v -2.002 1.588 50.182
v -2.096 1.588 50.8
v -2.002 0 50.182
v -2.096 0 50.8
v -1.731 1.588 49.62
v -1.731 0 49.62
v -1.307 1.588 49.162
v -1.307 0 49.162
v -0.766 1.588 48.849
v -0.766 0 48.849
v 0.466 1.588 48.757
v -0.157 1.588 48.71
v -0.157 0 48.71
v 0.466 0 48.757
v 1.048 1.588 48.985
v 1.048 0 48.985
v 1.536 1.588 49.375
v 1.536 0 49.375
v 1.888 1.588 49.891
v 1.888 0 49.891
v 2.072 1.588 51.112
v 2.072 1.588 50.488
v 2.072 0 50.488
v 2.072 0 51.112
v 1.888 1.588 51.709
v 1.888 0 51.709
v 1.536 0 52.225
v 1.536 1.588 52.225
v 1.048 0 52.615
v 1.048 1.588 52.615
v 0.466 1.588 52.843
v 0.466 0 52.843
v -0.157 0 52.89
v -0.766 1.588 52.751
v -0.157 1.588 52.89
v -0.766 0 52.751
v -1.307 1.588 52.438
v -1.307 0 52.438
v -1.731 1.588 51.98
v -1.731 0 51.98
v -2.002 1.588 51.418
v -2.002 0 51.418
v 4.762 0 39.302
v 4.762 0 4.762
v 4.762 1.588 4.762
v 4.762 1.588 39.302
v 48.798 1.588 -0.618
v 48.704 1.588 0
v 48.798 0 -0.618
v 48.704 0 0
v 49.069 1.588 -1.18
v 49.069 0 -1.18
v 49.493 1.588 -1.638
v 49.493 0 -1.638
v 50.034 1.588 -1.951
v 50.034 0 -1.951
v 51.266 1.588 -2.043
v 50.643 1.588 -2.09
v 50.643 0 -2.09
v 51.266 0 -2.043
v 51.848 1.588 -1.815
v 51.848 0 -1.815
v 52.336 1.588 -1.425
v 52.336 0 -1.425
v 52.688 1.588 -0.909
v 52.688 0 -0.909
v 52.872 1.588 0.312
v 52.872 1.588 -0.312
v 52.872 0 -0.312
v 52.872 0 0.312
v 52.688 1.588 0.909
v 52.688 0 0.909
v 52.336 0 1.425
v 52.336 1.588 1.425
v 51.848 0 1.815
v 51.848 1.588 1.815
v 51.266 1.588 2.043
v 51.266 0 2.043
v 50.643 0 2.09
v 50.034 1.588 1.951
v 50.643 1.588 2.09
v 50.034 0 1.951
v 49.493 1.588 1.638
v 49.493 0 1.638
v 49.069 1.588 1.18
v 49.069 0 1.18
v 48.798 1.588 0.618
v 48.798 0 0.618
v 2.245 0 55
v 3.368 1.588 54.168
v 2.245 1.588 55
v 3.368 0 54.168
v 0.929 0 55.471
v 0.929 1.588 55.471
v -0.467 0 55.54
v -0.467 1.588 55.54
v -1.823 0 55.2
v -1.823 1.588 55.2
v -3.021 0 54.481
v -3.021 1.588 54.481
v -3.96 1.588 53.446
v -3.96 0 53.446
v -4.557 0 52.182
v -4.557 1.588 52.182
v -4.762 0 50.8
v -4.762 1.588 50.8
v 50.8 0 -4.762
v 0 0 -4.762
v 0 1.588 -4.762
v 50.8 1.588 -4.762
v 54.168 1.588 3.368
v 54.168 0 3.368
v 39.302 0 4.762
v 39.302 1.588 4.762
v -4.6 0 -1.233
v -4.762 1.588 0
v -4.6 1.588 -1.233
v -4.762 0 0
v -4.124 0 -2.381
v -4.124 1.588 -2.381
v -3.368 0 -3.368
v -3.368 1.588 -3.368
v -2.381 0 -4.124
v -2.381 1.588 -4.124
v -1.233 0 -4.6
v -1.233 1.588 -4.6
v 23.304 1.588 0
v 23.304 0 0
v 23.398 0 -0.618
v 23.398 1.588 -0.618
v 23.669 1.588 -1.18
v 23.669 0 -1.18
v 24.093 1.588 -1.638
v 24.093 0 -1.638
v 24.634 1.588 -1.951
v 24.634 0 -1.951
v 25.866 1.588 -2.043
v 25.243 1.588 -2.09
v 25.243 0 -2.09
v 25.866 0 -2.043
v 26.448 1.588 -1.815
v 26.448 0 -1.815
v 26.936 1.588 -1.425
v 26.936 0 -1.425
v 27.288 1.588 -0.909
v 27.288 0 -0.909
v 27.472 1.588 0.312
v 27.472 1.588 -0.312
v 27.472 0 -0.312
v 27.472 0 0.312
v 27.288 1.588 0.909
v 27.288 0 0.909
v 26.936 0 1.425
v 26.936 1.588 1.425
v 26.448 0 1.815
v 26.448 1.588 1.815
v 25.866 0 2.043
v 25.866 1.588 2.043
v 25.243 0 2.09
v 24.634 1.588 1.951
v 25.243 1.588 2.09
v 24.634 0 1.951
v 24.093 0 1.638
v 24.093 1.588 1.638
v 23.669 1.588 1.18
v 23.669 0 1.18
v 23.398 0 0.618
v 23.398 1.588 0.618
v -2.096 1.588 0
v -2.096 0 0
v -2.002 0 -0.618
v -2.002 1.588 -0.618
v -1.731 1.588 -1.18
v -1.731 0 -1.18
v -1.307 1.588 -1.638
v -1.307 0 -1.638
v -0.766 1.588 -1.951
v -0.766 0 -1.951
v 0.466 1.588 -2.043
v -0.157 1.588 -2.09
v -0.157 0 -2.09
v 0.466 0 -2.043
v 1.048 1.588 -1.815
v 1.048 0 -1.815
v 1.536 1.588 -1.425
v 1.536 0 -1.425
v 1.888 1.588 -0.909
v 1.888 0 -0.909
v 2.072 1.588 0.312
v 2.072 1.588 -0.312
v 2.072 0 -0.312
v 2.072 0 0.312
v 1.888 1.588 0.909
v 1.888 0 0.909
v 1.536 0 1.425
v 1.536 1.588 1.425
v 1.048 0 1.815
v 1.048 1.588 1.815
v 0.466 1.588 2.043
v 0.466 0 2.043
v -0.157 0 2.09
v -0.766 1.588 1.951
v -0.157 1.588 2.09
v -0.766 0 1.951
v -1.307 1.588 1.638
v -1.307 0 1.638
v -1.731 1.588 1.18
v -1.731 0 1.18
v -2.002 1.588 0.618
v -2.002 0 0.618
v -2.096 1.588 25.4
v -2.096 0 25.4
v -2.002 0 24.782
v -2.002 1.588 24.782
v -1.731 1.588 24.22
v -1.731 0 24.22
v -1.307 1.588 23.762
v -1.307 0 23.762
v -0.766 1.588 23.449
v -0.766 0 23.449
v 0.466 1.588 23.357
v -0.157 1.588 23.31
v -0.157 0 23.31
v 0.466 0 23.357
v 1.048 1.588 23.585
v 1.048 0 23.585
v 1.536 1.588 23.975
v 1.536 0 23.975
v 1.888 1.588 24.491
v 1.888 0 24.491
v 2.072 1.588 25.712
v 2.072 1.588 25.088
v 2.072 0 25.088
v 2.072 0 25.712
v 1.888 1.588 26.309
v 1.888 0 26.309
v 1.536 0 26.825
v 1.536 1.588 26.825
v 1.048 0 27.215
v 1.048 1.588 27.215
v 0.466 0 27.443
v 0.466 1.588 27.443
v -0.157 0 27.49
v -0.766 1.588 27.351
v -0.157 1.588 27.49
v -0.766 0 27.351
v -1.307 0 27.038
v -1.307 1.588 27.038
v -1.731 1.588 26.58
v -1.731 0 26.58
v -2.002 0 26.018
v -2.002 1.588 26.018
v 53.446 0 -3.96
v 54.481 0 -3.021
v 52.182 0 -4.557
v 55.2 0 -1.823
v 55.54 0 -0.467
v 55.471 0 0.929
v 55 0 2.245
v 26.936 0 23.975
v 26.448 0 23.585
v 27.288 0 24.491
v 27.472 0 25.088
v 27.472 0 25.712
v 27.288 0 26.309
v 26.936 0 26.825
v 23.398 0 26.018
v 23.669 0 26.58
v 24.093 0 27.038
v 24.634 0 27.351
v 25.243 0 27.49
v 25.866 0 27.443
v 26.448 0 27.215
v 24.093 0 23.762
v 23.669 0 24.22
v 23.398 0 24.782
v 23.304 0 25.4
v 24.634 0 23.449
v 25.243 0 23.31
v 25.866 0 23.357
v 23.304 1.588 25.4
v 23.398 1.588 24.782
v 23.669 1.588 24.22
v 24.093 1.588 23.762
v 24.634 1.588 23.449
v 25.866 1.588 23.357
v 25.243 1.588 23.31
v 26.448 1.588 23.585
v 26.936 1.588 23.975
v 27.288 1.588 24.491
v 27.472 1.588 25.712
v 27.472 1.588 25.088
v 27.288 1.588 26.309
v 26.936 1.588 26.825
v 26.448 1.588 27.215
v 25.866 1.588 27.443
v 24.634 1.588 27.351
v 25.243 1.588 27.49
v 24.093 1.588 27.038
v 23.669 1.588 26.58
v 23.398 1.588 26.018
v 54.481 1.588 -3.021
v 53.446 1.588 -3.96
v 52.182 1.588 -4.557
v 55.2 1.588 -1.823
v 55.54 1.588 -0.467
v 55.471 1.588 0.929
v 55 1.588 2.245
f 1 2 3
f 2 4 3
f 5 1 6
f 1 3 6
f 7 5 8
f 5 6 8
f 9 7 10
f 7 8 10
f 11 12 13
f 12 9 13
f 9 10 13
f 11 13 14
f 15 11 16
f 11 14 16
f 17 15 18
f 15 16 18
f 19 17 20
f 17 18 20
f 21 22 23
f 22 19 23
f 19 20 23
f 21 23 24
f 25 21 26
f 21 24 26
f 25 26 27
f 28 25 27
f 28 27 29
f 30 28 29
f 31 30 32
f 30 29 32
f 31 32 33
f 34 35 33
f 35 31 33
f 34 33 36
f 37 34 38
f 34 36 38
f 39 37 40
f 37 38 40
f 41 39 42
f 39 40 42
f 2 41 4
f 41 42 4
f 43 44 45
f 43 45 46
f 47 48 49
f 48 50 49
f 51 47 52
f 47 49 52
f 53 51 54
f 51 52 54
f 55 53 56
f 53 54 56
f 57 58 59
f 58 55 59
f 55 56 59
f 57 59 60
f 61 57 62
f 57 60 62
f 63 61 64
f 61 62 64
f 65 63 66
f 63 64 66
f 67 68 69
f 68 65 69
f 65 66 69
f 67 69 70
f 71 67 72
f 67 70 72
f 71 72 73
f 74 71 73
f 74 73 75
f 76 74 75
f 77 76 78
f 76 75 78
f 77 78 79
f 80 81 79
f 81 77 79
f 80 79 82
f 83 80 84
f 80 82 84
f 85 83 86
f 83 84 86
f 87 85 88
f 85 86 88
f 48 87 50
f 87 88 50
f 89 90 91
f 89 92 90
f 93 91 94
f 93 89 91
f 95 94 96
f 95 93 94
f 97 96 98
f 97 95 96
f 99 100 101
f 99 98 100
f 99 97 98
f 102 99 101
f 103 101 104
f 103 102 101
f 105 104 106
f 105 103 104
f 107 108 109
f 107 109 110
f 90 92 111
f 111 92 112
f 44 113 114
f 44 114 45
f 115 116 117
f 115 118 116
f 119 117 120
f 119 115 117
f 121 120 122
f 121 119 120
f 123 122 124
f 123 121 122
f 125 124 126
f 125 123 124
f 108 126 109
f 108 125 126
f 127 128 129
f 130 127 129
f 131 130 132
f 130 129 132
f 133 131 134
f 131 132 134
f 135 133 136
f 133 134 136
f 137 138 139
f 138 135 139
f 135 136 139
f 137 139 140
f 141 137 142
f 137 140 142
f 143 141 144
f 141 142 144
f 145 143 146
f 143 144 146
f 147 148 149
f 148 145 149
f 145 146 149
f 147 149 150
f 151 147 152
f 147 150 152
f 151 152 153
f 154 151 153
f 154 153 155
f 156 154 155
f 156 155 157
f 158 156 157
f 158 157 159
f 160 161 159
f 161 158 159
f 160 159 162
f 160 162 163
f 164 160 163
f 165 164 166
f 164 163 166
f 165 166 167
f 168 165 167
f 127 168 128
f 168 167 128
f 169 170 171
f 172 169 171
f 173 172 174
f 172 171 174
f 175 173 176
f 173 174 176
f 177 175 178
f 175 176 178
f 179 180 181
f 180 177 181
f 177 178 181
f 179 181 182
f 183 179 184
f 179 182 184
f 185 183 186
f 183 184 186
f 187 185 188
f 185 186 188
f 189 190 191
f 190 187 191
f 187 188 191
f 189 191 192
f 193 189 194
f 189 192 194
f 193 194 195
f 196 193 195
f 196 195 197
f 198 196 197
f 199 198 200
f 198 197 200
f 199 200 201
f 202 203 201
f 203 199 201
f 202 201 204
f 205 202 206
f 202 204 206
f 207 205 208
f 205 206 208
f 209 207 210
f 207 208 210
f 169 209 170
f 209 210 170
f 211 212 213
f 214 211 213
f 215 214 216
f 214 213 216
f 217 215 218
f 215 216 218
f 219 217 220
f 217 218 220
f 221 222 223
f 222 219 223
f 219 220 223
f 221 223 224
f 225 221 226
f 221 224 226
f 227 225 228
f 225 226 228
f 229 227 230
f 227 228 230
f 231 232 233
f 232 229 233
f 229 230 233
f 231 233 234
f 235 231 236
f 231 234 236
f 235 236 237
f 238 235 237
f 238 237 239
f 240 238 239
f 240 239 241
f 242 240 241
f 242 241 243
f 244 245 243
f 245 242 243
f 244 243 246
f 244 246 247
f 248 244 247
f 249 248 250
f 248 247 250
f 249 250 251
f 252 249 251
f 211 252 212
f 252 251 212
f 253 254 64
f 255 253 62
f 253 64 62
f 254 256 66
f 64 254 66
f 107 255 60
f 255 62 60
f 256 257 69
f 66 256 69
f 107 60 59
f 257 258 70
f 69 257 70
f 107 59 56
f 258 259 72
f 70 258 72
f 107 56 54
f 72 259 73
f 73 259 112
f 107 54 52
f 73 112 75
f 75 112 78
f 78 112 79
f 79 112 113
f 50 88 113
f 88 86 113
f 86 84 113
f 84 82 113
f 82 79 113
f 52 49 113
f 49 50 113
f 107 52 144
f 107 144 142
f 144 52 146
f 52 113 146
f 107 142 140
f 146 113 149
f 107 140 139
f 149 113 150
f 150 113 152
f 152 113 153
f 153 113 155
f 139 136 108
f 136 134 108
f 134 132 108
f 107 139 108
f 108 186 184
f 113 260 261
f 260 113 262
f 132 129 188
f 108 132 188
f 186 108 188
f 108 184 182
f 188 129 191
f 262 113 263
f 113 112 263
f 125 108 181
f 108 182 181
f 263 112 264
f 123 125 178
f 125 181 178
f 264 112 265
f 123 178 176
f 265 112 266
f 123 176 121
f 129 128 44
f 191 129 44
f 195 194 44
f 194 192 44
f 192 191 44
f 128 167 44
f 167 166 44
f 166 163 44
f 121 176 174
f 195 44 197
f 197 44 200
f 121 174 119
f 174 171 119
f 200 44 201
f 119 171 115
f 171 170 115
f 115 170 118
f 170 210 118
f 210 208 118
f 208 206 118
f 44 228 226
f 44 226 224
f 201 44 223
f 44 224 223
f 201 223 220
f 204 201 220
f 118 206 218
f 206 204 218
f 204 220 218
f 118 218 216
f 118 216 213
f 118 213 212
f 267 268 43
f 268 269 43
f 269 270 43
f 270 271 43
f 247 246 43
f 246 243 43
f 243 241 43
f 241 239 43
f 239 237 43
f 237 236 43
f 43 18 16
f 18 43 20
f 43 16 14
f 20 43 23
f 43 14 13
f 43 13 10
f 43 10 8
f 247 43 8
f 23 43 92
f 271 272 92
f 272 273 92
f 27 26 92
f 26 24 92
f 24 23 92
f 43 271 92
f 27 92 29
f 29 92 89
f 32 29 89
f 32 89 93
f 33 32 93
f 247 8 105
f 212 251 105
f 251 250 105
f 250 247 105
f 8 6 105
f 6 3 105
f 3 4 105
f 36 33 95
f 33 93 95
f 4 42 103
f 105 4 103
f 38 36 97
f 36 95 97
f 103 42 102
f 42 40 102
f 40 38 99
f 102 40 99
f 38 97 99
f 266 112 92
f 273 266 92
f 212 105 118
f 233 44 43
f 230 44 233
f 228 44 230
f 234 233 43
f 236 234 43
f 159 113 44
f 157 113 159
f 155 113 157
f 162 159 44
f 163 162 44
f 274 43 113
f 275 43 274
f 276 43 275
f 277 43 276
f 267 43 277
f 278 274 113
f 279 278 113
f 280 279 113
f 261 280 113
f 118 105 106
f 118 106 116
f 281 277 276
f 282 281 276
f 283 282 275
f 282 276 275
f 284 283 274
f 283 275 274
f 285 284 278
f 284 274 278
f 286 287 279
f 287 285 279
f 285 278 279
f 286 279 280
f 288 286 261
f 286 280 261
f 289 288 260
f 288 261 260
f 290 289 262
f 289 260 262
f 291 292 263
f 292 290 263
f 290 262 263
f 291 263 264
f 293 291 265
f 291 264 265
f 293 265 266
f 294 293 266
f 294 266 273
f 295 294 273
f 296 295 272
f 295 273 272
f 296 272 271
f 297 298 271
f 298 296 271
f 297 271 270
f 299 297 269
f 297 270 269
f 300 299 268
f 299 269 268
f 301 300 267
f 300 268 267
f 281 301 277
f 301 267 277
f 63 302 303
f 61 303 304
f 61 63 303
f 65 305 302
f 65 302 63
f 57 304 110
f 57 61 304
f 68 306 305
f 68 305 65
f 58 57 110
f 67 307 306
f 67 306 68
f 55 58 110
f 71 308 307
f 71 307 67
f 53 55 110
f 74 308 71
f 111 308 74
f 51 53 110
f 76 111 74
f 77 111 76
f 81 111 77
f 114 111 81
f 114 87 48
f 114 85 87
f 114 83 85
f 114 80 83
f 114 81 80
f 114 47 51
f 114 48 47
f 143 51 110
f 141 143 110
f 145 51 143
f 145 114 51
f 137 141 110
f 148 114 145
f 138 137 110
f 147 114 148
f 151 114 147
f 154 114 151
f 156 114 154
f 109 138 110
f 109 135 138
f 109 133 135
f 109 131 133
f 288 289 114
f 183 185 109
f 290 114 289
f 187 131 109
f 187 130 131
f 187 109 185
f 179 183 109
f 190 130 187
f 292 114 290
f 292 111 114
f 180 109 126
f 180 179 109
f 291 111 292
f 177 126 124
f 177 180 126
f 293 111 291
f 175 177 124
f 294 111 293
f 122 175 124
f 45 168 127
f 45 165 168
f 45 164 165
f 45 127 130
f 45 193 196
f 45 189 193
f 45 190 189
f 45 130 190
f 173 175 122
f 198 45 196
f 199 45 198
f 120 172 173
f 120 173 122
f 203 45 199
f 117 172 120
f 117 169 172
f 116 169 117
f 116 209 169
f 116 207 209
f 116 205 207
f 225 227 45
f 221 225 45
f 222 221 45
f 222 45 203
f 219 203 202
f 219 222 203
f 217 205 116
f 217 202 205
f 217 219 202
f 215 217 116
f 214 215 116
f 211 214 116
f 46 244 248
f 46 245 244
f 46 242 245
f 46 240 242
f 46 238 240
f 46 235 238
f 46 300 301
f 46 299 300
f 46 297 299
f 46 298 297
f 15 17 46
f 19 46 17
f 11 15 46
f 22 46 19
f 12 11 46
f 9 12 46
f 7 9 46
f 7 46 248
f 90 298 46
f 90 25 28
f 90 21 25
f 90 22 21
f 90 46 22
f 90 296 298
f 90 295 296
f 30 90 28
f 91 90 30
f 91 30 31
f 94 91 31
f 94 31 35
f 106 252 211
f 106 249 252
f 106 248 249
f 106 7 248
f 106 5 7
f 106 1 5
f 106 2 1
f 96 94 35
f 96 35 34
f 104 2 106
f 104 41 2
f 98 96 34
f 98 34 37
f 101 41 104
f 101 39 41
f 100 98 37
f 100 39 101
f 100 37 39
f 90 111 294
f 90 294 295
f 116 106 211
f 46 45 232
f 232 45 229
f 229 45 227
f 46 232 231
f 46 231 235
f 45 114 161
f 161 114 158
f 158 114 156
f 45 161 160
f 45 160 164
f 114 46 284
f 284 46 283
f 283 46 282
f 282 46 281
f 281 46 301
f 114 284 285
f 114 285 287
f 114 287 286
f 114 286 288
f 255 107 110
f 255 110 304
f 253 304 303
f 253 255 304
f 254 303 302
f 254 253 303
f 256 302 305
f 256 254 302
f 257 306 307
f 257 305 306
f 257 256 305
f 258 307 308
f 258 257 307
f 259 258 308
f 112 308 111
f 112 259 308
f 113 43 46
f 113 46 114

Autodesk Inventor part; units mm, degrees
ref_plane "YZ Plane" through (0, 0, 0) normal (1, 0, 0) x (0, 1, 0)
ref_plane "XZ Plane" through (0, 0, 0) normal (0, 1, 0) x (-1, 0, 0)
ref_plane "XY Plane" through (0, 0, 0) normal (0, 0, 1) x (1, 0, 0)
sketch "main" plane through (0, 0, 0) normal (0, 0, 1) x (1, 0, 0)
  circle A0 centre (27.8145, 23.5161) radius 2.0955
  circle A1 centre (27.8145, -27.2839) radius 2.0955
  circle A2 centre (-22.9855, -27.2839) radius 2.0955
  arc A3 (-26.3531, -23.9163) -> (-22.9855, -32.0464) centre (-22.9855, -27.2839) ccw
  arc A4 (27.8145, -32.0464) -> (32.577, -27.2839) centre (27.8145, -27.2839) ccw
  arc A5 (32.577, 23.5161) -> (24.4469, 26.8837) centre (27.8145, 23.5161) ccw
  line L0 (32.577, 23.5161) -> (32.577, -27.2839)
  line L1 (27.8145, -32.0464) -> (-22.9855, -32.0464)
  line L2 (24.4469, 26.8837) -> (-26.3531, -23.9163)
  line L3 (-11.4879, -22.5214) -> (23.052, -22.5214)
  line L4 (23.052, -22.5214) -> (23.052, 12.0184)
  line L5 (23.052, 12.0184) -> (-11.4879, -22.5214)
  circle A6 centre (2.4145, -1.8839) radius 2.0955
  point P0 (11.2944, -10.7639)
  dimension "d3" = 4.191
  dimension "d4" = 4.191
  dimension "d5" = 4.191
  dimension "d7" = 9.525
  dimension "d8" = 4.191
  dimension "d9" = 4.7625
  dimension "d10" = 4.7625
  dimension "d11" = 4.7625
sketch "Sketch1" plane through (0, 0, 0) normal (0, 1, 0) x (-1, 0, 0)
  circle A0 centre (-25.4, 0) radius 2.0955
  circle A1 centre (0, 25.4) radius 2.0955
  circle A2 centre (0, 50.8) radius 2.0955
  circle A3 centre (0, 0) radius 2.0955
  circle A4 centre (-50.8, 0) radius 2.0955
  arc A5 (-54.1676, 3.3676) -> (-50.8, -4.7625) centre (-50.8, 0) ccw
  arc A6 (0, -4.7625) -> (4.7625, 0) centre (0, 0) ccw
  arc A7 (4.7625, 50.8) -> (-3.3676, 54.1676) centre (0, 50.8) ccw
  line L0 (4.7625, 50.8) -> (4.7625, 0)
  line L1 (0, -4.7625) -> (-50.8, -4.7625)
  line L2 (-3.3676, 54.1676) -> (-54.1676, 3.3676)
  line L3 (-39.3023, 4.7625) -> (-4.7625, 4.7625)
  line L4 (-4.7625, 4.7625) -> (-4.7625, 39.3023)
  line L5 (-4.7625, 39.3023) -> (-39.3023, 4.7625)
  circle A8 centre (-25.4, 25.4) radius 2.0955
  dimension "d2" = 4.191
  dimension "d6" = 4.191
extrude "Extrusion1" add sketch "Sketch1" along normal blind 1.5875
equation "\"BendRadius\" = Thickness"
equation "\"BendReliefWidth\" = Thickness"
equation "\"BendReliefDepth\" = 0.5 * Thickness"
equation "\"CornerReliefSize\" = 4 * Thickness"
equation "\"MinimumRemnant\" = 2 * Thickness"
equation "\"TransitionRadius\" = BendRadius"
equation "\"JacobiRadiusSize\" = BendRadius"
equation "\"GapSize\" = Thickness"
equation "\"Thickness\" = 1.5875"
properties part number "Arm Triangle Gusset" material "Acetal Resin, White"
